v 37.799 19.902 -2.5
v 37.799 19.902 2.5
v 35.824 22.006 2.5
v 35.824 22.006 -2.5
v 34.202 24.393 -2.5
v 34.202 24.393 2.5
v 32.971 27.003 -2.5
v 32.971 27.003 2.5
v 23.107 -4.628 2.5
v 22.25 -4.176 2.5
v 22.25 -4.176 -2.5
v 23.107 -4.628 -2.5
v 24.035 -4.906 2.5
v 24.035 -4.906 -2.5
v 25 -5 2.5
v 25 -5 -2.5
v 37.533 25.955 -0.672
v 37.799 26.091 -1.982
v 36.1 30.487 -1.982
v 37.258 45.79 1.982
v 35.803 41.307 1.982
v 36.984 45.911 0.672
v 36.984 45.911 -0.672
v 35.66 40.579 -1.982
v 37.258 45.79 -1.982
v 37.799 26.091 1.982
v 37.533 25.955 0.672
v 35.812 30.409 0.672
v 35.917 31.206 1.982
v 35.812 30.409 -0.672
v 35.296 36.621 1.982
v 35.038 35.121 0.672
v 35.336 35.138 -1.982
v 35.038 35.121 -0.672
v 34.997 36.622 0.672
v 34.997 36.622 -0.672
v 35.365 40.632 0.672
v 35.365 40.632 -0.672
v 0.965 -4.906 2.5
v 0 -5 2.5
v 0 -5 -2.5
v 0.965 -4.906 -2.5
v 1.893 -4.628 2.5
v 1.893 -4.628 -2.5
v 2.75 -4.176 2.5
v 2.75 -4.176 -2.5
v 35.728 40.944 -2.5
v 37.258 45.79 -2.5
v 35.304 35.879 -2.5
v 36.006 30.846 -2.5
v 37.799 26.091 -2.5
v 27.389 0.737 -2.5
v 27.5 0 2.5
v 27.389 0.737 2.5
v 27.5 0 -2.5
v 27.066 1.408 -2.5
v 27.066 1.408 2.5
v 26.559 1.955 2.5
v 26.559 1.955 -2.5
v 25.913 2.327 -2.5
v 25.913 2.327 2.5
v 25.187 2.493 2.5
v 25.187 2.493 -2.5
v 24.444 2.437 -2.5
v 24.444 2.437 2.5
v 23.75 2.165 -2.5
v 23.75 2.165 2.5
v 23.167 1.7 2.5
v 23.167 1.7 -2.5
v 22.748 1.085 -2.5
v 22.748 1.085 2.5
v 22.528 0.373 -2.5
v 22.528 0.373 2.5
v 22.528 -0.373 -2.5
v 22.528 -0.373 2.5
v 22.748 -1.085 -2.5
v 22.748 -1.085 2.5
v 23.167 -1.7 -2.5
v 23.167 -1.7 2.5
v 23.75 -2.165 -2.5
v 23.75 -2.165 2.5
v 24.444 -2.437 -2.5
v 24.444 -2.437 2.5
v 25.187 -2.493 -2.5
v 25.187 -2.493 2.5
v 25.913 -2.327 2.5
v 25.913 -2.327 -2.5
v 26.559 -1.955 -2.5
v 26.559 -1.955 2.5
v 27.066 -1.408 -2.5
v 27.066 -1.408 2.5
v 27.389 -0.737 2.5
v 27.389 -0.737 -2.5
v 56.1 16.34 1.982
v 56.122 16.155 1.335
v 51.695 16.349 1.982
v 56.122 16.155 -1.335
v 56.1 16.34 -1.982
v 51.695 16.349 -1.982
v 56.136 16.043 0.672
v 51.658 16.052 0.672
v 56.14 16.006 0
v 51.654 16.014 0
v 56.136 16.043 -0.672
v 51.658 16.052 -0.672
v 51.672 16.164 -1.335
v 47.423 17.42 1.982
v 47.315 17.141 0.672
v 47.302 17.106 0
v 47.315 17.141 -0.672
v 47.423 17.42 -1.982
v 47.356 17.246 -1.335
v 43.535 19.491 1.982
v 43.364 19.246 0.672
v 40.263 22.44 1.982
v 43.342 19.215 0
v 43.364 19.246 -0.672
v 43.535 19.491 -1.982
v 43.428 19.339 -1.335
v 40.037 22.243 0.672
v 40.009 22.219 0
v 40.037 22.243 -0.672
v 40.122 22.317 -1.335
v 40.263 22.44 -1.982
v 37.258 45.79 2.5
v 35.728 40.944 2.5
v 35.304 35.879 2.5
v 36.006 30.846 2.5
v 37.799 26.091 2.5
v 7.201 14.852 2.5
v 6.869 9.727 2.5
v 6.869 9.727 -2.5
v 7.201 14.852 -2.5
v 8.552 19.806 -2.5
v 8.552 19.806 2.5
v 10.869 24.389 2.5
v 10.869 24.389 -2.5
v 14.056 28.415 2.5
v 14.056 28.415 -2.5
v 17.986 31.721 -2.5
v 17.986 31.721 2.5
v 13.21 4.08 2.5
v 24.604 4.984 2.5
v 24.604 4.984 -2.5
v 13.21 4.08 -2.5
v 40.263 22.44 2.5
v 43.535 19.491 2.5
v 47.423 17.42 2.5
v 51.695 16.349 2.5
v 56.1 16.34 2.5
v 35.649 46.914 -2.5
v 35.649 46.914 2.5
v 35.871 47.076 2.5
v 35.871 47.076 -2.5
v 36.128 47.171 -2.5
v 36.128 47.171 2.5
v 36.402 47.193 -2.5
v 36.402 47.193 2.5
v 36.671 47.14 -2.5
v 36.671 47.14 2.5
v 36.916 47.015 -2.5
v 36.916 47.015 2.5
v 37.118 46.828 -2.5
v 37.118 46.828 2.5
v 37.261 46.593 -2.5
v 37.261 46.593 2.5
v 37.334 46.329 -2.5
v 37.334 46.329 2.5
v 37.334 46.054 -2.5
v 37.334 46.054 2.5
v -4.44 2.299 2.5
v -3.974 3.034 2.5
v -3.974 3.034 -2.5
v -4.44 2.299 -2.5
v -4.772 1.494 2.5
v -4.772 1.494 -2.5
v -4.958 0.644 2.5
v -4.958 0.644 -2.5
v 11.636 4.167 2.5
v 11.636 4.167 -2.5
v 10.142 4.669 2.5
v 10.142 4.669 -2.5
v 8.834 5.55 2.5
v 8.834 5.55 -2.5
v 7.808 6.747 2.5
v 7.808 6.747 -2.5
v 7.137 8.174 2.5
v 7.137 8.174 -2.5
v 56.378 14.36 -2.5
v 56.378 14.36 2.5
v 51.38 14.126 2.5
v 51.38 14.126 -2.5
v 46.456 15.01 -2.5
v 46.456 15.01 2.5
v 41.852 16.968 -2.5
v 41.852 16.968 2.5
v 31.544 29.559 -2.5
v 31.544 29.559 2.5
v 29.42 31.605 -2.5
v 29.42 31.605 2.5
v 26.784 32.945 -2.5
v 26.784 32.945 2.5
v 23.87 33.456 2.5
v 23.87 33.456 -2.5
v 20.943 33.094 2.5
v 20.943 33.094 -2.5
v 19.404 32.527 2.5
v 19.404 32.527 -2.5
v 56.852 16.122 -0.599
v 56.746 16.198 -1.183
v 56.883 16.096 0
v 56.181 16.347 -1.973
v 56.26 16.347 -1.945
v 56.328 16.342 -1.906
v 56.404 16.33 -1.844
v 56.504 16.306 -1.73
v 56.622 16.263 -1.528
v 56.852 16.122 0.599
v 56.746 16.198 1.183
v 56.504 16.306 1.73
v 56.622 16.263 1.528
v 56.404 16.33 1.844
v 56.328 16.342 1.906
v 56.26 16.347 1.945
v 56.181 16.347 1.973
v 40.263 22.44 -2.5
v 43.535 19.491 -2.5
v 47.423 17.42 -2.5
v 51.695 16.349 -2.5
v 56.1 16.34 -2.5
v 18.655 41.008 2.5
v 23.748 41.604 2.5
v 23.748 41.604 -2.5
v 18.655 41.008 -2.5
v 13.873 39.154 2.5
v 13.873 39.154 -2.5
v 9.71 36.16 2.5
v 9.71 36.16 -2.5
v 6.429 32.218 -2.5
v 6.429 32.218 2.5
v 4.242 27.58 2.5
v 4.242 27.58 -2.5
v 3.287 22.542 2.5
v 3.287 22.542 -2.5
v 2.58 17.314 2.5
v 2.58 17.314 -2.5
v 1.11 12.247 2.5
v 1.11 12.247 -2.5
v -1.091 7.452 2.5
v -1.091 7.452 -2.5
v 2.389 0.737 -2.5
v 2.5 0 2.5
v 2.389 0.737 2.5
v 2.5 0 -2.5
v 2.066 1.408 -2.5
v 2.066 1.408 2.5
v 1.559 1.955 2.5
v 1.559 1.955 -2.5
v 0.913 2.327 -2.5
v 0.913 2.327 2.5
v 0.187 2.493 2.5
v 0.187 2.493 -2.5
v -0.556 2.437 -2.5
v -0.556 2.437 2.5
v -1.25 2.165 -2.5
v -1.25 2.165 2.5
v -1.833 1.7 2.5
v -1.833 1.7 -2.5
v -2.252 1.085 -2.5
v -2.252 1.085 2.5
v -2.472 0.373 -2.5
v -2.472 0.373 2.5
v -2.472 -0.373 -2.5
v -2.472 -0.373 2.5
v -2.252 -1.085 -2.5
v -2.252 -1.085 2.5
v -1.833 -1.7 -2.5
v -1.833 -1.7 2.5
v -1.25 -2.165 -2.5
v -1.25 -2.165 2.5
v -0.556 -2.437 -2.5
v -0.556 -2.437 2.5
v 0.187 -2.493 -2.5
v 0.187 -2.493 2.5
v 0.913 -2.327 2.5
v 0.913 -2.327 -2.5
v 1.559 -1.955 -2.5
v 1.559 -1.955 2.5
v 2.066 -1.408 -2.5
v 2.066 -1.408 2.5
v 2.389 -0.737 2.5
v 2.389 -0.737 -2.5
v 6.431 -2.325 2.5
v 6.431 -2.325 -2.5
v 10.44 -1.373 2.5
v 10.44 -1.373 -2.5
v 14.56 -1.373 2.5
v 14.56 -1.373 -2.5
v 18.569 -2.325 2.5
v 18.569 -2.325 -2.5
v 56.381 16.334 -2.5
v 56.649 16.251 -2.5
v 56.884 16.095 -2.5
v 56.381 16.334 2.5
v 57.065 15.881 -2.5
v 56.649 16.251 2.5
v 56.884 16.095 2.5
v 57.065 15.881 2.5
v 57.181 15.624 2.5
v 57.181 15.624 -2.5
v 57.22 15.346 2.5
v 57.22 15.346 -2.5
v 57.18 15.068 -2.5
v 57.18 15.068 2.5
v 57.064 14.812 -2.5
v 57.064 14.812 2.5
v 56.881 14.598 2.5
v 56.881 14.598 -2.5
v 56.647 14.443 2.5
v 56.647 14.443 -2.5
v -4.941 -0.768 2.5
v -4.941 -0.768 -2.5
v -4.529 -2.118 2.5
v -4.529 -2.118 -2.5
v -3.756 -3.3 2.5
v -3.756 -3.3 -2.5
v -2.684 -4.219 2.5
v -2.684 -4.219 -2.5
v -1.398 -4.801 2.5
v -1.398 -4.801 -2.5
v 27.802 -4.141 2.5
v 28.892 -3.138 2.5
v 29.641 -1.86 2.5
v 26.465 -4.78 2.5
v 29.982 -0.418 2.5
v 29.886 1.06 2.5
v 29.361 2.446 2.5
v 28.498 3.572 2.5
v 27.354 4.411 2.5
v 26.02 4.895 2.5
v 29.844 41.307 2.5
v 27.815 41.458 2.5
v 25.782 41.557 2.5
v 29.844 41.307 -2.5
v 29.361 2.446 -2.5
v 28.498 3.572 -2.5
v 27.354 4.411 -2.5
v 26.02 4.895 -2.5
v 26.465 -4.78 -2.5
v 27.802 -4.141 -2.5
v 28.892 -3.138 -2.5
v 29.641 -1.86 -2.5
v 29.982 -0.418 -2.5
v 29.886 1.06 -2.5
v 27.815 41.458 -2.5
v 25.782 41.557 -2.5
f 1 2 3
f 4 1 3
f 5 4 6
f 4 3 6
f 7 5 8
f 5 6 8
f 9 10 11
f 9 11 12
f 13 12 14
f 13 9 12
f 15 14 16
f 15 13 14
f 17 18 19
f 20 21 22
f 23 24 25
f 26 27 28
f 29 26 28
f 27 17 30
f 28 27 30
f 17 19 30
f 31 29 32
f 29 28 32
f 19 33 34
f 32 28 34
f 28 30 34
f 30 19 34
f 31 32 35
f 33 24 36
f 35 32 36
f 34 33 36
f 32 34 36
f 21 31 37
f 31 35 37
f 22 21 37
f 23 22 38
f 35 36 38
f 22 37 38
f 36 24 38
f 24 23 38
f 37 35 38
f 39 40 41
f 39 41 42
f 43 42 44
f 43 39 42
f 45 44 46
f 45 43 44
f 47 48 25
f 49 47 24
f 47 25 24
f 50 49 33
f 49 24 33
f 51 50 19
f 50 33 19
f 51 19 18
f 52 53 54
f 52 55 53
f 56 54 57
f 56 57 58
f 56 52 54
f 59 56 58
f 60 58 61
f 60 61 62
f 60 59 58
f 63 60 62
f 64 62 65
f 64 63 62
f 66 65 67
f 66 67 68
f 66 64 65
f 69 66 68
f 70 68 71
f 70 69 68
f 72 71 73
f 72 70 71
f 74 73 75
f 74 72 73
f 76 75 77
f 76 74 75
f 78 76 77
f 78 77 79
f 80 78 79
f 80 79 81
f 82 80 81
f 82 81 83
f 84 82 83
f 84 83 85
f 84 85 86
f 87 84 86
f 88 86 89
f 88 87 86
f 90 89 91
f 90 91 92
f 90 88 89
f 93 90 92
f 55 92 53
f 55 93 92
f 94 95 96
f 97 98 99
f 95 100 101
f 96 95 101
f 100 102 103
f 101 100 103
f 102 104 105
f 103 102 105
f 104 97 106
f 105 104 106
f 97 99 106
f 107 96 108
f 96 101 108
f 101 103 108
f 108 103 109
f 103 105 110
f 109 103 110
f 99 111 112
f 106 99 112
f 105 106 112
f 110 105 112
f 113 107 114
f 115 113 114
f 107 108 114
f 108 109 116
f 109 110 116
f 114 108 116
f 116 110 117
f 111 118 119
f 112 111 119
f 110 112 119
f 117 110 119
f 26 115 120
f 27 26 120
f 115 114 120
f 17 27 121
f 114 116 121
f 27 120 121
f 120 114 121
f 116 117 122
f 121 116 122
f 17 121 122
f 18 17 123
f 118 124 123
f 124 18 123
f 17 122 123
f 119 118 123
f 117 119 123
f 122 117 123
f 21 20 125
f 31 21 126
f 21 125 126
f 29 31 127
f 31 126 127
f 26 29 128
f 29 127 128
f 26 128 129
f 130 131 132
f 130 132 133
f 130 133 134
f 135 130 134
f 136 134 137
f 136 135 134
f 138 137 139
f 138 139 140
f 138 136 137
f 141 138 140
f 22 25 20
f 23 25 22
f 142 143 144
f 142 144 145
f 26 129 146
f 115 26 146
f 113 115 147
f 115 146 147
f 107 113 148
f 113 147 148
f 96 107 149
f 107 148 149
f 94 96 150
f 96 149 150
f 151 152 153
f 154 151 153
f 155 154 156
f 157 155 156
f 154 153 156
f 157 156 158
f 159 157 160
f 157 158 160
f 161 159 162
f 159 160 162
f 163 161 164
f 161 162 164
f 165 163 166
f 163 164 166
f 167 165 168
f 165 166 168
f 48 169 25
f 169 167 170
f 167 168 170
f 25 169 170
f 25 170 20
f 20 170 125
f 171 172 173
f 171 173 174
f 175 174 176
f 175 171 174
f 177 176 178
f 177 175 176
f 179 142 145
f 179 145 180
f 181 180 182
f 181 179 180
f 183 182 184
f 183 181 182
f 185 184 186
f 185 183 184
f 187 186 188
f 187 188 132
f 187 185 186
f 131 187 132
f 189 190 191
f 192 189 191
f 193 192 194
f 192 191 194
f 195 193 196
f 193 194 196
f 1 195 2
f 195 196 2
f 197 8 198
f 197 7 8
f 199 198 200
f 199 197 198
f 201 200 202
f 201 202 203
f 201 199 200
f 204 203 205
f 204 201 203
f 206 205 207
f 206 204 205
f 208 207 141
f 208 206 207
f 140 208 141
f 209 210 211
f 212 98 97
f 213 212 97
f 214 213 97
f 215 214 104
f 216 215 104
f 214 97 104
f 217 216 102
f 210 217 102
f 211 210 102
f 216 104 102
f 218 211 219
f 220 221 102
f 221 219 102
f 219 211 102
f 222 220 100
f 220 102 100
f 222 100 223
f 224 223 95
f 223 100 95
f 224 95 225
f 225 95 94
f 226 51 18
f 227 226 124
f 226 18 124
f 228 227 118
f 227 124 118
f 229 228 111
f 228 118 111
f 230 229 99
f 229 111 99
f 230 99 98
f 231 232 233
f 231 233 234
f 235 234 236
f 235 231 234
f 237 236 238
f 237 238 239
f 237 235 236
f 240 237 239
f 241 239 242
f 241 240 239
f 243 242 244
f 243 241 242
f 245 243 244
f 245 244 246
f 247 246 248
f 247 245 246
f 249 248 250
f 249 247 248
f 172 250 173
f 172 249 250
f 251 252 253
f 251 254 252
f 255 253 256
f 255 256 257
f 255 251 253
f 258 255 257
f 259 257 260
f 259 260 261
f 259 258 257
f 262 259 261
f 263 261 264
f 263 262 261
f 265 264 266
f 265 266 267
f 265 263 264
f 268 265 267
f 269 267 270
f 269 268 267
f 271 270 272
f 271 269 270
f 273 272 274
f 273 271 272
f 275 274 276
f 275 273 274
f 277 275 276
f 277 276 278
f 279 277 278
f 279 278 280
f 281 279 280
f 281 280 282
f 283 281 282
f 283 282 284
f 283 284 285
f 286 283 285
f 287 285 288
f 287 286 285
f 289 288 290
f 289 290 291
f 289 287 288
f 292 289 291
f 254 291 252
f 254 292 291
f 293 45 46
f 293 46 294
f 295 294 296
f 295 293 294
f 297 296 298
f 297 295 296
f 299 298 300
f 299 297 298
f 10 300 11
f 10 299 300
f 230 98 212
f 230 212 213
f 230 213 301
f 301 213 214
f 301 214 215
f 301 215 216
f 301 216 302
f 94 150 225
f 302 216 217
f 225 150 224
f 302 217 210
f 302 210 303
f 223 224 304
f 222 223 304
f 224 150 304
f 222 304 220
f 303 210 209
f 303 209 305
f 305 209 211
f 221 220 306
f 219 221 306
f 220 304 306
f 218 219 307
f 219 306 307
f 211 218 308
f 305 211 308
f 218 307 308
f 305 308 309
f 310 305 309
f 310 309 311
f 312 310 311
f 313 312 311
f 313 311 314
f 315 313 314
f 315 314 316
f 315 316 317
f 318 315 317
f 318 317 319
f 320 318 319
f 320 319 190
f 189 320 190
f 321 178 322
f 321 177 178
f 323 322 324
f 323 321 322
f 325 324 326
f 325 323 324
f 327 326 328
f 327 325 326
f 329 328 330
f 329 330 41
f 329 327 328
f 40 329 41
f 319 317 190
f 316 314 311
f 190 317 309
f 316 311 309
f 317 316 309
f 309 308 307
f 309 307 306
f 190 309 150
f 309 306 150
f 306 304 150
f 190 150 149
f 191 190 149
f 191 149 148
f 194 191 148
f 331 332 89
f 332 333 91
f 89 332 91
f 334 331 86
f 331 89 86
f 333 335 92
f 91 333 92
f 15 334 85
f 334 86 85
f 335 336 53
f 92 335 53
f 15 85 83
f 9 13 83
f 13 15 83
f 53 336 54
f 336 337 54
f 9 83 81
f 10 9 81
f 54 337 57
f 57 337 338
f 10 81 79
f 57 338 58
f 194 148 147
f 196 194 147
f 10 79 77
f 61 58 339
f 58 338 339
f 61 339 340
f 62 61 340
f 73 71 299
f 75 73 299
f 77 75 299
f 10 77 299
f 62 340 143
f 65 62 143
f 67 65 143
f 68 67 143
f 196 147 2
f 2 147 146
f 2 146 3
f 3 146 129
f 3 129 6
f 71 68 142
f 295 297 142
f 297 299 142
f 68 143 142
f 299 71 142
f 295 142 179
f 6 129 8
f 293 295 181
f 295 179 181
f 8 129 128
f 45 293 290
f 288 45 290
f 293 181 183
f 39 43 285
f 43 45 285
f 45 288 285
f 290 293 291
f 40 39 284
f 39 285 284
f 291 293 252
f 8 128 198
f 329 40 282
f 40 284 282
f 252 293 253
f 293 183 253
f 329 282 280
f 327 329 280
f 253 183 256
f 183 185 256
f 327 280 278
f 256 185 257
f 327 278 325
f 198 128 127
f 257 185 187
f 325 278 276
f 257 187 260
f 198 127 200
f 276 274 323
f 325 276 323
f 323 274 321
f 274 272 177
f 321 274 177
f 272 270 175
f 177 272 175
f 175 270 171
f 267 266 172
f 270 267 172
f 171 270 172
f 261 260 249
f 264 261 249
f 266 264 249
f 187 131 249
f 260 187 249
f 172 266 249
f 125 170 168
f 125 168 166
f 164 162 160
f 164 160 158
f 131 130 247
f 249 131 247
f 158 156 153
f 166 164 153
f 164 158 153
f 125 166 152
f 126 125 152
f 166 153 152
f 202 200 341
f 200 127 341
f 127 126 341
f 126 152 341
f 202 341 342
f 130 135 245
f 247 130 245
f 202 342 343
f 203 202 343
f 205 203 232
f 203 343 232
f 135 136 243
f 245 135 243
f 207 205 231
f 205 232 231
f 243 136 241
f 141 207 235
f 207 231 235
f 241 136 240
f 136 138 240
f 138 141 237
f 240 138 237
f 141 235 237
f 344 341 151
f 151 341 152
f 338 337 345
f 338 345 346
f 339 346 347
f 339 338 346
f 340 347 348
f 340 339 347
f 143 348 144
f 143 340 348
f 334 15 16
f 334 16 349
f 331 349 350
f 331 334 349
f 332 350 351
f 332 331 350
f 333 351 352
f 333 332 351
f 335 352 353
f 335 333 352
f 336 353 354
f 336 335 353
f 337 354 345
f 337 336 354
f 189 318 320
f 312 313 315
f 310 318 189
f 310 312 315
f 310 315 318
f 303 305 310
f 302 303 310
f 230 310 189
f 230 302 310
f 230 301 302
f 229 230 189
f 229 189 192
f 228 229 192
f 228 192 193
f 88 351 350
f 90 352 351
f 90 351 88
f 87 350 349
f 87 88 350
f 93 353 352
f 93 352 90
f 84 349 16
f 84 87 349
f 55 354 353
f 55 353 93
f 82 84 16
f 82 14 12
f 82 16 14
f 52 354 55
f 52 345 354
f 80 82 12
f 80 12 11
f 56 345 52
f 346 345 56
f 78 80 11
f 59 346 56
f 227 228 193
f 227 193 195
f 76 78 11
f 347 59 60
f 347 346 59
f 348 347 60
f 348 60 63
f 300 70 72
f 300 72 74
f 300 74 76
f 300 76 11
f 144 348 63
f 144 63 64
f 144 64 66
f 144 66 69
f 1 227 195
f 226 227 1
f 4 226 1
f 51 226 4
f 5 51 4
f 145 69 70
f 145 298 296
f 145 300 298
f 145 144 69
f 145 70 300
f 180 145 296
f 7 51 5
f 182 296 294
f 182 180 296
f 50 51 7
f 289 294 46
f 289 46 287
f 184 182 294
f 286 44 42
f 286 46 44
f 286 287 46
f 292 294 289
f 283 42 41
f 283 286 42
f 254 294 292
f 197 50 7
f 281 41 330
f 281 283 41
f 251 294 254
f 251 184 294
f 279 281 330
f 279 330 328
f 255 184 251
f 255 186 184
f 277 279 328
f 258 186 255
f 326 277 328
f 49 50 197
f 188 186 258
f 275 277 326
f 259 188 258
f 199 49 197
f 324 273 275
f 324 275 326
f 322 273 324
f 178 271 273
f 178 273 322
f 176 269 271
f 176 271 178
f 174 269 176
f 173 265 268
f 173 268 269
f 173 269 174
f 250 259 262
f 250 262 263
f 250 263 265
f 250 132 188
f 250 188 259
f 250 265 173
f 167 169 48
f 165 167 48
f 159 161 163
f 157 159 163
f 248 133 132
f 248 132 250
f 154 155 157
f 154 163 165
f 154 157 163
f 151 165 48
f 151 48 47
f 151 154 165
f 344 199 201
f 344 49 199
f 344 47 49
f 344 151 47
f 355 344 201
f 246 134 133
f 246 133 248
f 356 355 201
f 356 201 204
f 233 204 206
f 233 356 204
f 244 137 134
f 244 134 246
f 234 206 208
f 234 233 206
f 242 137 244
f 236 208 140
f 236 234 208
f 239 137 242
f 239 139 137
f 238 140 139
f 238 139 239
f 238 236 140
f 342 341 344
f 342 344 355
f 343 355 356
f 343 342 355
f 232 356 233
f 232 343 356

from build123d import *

# Parameters (mm, degrees)
SKETCH_1_R          = 2.5
EXTRUDE_1_DEPTH     = 2.5
SKETCH_2_OUTSIDE_W  = 86.761
SKETCH_2_OUTSIDE_H  = 89.395
CUT_EXTRUDE_1_DEPTH = 5
EXTRUDE_3_DEPTH     = 5
SKETCH_9_R          = 6
FILLET_1_R          = 10
CUT_EXTRUDE_2_DEPTH = 10


with BuildPart() as part:
    # 草圖1 → 填料-伸長1 (new body, symmetric)
    with BuildSketch(Plane.XY):
        with BuildLine():
            Line((0, -5), (25, -5))
            ThreePointArc((25, -5), (29.31444757, -2.526963033), (29.360979806, 2.445783133))
            Line((29.360979806, 2.445783133), (15.064071346, 27.938038866))
            Line((15.064071346, 27.938038866), (44.994741867, 27.938038866))
            Line((44.994741867, 27.938038866), (44.994741867, 63.392785695))
            Line((44.994741867, 63.392785695), (-20.763646925, 63.392785695))
            Line((-20.763646925, 63.392785695), (-20.763646925, 27.938038866))
            Line((-20.763646925, 27.938038866), (-1.414273127, 27.938038866))
            Line((-1.414273127, 27.938038866), (-4.9583743, 0.643835616))
            ThreePointArc((-4.9583743, 0.643835616), (-3.756273292, -3.300062266), (0, -5))
        make_face()
        with Locations((25, 0)):
            Circle(SKETCH_1_R, mode=Mode.SUBTRACT)
        Circle(SKETCH_1_R, mode=Mode.SUBTRACT)
    extrude(amount=EXTRUDE_1_DEPTH, both=True)

    # 草圖2 outside → 除料-伸長1 (cut)
    with BuildSketch(Plane.XY.offset(2.5)):
        with Locations((12.1155, 29.1965)):
            Rectangle(SKETCH_2_OUTSIDE_W, SKETCH_2_OUTSIDE_H)
        with BuildLine():
            Line((31.958651871, 36.150509371), (34.562055634, 40.749856019))
            ThreePointArc((34.562055634, 40.749856019), (29.16979084, 41.362709118), (23.748184909, 41.60415823))
            ThreePointArc((23.748184909, 41.60415823), (9.709628086, 36.160280684), (3.287148618, 22.5415936))
            ThreePointArc((3.287148618, 22.5415936), (1.109618969, 12.24710035), (-3.974011943, 3.034341622))
            ThreePointArc((-3.974011943, 3.034341622), (-3.656567639, -3.410207194), (2.750229007, -4.17567245))
            ThreePointArc((2.750229007, -4.17567245), (12.5, -1.253368592), (22.249770993, -4.17567245))
            ThreePointArc((22.249770993, -4.17567245), (29.842584669, -1.244738415), (24.604254755, 4.984313965))
            Line((24.604254755, 4.984313965), (13.210184283, 4.079645991))
            ThreePointArc((13.210184283, 4.079645991), (8.834388462, 5.55019775), (6.86933477, 9.727358931))
            ThreePointArc((6.86933477, 9.727358931), (13.861035744, 28.211579962), (31.958651871, 36.150509371))
        make_face(mode=Mode.SUBTRACT)
    extrude(amount=-CUT_EXTRUDE_1_DEPTH, mode=Mode.SUBTRACT)

    # 草圖6 → 填料-伸長3 (add)
    with BuildSketch(Plane.XY.offset(2.5)):
        with BuildLine():
            Line((29.843670315, 41.306571089), (35.648712263, 46.914150559))
            ThreePointArc((35.648712263, 46.914150559), (36.916127955, 47.014718803), (37.257884128, 45.79011306))
            ThreePointArc((37.257884128, 45.79011306), (35.304038414, 35.87931312), (37.799168171, 26.090758784))
            ThreePointArc((37.799168171, 26.090758784), (45.415881251, 18.337037181), (56.099880608, 16.340371315))
            ThreePointArc((56.099880608, 16.340371315), (57.209900526, 15.486647675), (56.377991211, 14.360186329))
            ThreePointArc((56.377991211, 14.360186329), (46.455950686, 15.010232793), (37.799168171, 19.902018262))
            ThreePointArc((37.799168171, 19.902018262), (32.860967015, 27.300914678), (31.958651871, 36.150509371))
            Line((31.958651871, 36.150509371), (34.562055634, 40.749856019))
            ThreePointArc((34.562055634, 40.749856019), (32.207046263, 41.063668613), (29.843670315, 41.306571089))
        make_face()
    extrude(amount=-EXTRUDE_3_DEPTH)

    # 除料-掃出3: sweep along a path in 草圖16
    with BuildLine(Plane.XY) as sweep_3_path:
        ThreePointArc((56.099880608, 16.340371315), (45.415881251, 18.337037181), (37.799168171, 26.090758784))
        ThreePointArc((37.799168171, 26.090758784), (35.304038414, 35.87931312), (37.257884128, 45.79011306))
    # 草圖9 → 除料-掃出3 (sweep, cut)
    with BuildSketch(Plane(origin=(37.257884128, 45.79011306, 2.5), x_dir=(0.914403512, -0.404803924, 0), z_dir=(0.404803924, 0.914403512, 0))):
        with Locations((5.663169824, 2.5)):
            Circle(SKETCH_9_R)
    sweep(path=sweep_3_path.line, mode=Mode.SUBTRACT)

    # 圓角1
    fillet_1_edges = [part.edges().sort_by_distance(p)[0] for p in [
        (31.958651871, 36.150509371, 0),
    ]]
    fillet(fillet_1_edges, radius=FILLET_1_R)

    # 草圖20 → 除料-伸長2 (cut)
    with BuildSketch(Plane(origin=(57.238055568, 6.903294961, 0), x_dir=(0, 0, 1), z_dir=(-0.992805403, -0.119739017, 0))):
        with BuildLine():
            Line((1.982046302, 9.505464342), (-1.982046302, 9.505464342))
            ThreePointArc((-1.982046302, 9.505464342), (-1.005231579, 9.25344106), (0, 9.168634166))
            ThreePointArc((0, 9.168634166), (1.005231579, 9.25344106), (1.982046302, 9.505464342))
        make_face()
    extrude(amount=-CUT_EXTRUDE_2_DEPTH, mode=Mode.SUBTRACT)


solid = part.part
